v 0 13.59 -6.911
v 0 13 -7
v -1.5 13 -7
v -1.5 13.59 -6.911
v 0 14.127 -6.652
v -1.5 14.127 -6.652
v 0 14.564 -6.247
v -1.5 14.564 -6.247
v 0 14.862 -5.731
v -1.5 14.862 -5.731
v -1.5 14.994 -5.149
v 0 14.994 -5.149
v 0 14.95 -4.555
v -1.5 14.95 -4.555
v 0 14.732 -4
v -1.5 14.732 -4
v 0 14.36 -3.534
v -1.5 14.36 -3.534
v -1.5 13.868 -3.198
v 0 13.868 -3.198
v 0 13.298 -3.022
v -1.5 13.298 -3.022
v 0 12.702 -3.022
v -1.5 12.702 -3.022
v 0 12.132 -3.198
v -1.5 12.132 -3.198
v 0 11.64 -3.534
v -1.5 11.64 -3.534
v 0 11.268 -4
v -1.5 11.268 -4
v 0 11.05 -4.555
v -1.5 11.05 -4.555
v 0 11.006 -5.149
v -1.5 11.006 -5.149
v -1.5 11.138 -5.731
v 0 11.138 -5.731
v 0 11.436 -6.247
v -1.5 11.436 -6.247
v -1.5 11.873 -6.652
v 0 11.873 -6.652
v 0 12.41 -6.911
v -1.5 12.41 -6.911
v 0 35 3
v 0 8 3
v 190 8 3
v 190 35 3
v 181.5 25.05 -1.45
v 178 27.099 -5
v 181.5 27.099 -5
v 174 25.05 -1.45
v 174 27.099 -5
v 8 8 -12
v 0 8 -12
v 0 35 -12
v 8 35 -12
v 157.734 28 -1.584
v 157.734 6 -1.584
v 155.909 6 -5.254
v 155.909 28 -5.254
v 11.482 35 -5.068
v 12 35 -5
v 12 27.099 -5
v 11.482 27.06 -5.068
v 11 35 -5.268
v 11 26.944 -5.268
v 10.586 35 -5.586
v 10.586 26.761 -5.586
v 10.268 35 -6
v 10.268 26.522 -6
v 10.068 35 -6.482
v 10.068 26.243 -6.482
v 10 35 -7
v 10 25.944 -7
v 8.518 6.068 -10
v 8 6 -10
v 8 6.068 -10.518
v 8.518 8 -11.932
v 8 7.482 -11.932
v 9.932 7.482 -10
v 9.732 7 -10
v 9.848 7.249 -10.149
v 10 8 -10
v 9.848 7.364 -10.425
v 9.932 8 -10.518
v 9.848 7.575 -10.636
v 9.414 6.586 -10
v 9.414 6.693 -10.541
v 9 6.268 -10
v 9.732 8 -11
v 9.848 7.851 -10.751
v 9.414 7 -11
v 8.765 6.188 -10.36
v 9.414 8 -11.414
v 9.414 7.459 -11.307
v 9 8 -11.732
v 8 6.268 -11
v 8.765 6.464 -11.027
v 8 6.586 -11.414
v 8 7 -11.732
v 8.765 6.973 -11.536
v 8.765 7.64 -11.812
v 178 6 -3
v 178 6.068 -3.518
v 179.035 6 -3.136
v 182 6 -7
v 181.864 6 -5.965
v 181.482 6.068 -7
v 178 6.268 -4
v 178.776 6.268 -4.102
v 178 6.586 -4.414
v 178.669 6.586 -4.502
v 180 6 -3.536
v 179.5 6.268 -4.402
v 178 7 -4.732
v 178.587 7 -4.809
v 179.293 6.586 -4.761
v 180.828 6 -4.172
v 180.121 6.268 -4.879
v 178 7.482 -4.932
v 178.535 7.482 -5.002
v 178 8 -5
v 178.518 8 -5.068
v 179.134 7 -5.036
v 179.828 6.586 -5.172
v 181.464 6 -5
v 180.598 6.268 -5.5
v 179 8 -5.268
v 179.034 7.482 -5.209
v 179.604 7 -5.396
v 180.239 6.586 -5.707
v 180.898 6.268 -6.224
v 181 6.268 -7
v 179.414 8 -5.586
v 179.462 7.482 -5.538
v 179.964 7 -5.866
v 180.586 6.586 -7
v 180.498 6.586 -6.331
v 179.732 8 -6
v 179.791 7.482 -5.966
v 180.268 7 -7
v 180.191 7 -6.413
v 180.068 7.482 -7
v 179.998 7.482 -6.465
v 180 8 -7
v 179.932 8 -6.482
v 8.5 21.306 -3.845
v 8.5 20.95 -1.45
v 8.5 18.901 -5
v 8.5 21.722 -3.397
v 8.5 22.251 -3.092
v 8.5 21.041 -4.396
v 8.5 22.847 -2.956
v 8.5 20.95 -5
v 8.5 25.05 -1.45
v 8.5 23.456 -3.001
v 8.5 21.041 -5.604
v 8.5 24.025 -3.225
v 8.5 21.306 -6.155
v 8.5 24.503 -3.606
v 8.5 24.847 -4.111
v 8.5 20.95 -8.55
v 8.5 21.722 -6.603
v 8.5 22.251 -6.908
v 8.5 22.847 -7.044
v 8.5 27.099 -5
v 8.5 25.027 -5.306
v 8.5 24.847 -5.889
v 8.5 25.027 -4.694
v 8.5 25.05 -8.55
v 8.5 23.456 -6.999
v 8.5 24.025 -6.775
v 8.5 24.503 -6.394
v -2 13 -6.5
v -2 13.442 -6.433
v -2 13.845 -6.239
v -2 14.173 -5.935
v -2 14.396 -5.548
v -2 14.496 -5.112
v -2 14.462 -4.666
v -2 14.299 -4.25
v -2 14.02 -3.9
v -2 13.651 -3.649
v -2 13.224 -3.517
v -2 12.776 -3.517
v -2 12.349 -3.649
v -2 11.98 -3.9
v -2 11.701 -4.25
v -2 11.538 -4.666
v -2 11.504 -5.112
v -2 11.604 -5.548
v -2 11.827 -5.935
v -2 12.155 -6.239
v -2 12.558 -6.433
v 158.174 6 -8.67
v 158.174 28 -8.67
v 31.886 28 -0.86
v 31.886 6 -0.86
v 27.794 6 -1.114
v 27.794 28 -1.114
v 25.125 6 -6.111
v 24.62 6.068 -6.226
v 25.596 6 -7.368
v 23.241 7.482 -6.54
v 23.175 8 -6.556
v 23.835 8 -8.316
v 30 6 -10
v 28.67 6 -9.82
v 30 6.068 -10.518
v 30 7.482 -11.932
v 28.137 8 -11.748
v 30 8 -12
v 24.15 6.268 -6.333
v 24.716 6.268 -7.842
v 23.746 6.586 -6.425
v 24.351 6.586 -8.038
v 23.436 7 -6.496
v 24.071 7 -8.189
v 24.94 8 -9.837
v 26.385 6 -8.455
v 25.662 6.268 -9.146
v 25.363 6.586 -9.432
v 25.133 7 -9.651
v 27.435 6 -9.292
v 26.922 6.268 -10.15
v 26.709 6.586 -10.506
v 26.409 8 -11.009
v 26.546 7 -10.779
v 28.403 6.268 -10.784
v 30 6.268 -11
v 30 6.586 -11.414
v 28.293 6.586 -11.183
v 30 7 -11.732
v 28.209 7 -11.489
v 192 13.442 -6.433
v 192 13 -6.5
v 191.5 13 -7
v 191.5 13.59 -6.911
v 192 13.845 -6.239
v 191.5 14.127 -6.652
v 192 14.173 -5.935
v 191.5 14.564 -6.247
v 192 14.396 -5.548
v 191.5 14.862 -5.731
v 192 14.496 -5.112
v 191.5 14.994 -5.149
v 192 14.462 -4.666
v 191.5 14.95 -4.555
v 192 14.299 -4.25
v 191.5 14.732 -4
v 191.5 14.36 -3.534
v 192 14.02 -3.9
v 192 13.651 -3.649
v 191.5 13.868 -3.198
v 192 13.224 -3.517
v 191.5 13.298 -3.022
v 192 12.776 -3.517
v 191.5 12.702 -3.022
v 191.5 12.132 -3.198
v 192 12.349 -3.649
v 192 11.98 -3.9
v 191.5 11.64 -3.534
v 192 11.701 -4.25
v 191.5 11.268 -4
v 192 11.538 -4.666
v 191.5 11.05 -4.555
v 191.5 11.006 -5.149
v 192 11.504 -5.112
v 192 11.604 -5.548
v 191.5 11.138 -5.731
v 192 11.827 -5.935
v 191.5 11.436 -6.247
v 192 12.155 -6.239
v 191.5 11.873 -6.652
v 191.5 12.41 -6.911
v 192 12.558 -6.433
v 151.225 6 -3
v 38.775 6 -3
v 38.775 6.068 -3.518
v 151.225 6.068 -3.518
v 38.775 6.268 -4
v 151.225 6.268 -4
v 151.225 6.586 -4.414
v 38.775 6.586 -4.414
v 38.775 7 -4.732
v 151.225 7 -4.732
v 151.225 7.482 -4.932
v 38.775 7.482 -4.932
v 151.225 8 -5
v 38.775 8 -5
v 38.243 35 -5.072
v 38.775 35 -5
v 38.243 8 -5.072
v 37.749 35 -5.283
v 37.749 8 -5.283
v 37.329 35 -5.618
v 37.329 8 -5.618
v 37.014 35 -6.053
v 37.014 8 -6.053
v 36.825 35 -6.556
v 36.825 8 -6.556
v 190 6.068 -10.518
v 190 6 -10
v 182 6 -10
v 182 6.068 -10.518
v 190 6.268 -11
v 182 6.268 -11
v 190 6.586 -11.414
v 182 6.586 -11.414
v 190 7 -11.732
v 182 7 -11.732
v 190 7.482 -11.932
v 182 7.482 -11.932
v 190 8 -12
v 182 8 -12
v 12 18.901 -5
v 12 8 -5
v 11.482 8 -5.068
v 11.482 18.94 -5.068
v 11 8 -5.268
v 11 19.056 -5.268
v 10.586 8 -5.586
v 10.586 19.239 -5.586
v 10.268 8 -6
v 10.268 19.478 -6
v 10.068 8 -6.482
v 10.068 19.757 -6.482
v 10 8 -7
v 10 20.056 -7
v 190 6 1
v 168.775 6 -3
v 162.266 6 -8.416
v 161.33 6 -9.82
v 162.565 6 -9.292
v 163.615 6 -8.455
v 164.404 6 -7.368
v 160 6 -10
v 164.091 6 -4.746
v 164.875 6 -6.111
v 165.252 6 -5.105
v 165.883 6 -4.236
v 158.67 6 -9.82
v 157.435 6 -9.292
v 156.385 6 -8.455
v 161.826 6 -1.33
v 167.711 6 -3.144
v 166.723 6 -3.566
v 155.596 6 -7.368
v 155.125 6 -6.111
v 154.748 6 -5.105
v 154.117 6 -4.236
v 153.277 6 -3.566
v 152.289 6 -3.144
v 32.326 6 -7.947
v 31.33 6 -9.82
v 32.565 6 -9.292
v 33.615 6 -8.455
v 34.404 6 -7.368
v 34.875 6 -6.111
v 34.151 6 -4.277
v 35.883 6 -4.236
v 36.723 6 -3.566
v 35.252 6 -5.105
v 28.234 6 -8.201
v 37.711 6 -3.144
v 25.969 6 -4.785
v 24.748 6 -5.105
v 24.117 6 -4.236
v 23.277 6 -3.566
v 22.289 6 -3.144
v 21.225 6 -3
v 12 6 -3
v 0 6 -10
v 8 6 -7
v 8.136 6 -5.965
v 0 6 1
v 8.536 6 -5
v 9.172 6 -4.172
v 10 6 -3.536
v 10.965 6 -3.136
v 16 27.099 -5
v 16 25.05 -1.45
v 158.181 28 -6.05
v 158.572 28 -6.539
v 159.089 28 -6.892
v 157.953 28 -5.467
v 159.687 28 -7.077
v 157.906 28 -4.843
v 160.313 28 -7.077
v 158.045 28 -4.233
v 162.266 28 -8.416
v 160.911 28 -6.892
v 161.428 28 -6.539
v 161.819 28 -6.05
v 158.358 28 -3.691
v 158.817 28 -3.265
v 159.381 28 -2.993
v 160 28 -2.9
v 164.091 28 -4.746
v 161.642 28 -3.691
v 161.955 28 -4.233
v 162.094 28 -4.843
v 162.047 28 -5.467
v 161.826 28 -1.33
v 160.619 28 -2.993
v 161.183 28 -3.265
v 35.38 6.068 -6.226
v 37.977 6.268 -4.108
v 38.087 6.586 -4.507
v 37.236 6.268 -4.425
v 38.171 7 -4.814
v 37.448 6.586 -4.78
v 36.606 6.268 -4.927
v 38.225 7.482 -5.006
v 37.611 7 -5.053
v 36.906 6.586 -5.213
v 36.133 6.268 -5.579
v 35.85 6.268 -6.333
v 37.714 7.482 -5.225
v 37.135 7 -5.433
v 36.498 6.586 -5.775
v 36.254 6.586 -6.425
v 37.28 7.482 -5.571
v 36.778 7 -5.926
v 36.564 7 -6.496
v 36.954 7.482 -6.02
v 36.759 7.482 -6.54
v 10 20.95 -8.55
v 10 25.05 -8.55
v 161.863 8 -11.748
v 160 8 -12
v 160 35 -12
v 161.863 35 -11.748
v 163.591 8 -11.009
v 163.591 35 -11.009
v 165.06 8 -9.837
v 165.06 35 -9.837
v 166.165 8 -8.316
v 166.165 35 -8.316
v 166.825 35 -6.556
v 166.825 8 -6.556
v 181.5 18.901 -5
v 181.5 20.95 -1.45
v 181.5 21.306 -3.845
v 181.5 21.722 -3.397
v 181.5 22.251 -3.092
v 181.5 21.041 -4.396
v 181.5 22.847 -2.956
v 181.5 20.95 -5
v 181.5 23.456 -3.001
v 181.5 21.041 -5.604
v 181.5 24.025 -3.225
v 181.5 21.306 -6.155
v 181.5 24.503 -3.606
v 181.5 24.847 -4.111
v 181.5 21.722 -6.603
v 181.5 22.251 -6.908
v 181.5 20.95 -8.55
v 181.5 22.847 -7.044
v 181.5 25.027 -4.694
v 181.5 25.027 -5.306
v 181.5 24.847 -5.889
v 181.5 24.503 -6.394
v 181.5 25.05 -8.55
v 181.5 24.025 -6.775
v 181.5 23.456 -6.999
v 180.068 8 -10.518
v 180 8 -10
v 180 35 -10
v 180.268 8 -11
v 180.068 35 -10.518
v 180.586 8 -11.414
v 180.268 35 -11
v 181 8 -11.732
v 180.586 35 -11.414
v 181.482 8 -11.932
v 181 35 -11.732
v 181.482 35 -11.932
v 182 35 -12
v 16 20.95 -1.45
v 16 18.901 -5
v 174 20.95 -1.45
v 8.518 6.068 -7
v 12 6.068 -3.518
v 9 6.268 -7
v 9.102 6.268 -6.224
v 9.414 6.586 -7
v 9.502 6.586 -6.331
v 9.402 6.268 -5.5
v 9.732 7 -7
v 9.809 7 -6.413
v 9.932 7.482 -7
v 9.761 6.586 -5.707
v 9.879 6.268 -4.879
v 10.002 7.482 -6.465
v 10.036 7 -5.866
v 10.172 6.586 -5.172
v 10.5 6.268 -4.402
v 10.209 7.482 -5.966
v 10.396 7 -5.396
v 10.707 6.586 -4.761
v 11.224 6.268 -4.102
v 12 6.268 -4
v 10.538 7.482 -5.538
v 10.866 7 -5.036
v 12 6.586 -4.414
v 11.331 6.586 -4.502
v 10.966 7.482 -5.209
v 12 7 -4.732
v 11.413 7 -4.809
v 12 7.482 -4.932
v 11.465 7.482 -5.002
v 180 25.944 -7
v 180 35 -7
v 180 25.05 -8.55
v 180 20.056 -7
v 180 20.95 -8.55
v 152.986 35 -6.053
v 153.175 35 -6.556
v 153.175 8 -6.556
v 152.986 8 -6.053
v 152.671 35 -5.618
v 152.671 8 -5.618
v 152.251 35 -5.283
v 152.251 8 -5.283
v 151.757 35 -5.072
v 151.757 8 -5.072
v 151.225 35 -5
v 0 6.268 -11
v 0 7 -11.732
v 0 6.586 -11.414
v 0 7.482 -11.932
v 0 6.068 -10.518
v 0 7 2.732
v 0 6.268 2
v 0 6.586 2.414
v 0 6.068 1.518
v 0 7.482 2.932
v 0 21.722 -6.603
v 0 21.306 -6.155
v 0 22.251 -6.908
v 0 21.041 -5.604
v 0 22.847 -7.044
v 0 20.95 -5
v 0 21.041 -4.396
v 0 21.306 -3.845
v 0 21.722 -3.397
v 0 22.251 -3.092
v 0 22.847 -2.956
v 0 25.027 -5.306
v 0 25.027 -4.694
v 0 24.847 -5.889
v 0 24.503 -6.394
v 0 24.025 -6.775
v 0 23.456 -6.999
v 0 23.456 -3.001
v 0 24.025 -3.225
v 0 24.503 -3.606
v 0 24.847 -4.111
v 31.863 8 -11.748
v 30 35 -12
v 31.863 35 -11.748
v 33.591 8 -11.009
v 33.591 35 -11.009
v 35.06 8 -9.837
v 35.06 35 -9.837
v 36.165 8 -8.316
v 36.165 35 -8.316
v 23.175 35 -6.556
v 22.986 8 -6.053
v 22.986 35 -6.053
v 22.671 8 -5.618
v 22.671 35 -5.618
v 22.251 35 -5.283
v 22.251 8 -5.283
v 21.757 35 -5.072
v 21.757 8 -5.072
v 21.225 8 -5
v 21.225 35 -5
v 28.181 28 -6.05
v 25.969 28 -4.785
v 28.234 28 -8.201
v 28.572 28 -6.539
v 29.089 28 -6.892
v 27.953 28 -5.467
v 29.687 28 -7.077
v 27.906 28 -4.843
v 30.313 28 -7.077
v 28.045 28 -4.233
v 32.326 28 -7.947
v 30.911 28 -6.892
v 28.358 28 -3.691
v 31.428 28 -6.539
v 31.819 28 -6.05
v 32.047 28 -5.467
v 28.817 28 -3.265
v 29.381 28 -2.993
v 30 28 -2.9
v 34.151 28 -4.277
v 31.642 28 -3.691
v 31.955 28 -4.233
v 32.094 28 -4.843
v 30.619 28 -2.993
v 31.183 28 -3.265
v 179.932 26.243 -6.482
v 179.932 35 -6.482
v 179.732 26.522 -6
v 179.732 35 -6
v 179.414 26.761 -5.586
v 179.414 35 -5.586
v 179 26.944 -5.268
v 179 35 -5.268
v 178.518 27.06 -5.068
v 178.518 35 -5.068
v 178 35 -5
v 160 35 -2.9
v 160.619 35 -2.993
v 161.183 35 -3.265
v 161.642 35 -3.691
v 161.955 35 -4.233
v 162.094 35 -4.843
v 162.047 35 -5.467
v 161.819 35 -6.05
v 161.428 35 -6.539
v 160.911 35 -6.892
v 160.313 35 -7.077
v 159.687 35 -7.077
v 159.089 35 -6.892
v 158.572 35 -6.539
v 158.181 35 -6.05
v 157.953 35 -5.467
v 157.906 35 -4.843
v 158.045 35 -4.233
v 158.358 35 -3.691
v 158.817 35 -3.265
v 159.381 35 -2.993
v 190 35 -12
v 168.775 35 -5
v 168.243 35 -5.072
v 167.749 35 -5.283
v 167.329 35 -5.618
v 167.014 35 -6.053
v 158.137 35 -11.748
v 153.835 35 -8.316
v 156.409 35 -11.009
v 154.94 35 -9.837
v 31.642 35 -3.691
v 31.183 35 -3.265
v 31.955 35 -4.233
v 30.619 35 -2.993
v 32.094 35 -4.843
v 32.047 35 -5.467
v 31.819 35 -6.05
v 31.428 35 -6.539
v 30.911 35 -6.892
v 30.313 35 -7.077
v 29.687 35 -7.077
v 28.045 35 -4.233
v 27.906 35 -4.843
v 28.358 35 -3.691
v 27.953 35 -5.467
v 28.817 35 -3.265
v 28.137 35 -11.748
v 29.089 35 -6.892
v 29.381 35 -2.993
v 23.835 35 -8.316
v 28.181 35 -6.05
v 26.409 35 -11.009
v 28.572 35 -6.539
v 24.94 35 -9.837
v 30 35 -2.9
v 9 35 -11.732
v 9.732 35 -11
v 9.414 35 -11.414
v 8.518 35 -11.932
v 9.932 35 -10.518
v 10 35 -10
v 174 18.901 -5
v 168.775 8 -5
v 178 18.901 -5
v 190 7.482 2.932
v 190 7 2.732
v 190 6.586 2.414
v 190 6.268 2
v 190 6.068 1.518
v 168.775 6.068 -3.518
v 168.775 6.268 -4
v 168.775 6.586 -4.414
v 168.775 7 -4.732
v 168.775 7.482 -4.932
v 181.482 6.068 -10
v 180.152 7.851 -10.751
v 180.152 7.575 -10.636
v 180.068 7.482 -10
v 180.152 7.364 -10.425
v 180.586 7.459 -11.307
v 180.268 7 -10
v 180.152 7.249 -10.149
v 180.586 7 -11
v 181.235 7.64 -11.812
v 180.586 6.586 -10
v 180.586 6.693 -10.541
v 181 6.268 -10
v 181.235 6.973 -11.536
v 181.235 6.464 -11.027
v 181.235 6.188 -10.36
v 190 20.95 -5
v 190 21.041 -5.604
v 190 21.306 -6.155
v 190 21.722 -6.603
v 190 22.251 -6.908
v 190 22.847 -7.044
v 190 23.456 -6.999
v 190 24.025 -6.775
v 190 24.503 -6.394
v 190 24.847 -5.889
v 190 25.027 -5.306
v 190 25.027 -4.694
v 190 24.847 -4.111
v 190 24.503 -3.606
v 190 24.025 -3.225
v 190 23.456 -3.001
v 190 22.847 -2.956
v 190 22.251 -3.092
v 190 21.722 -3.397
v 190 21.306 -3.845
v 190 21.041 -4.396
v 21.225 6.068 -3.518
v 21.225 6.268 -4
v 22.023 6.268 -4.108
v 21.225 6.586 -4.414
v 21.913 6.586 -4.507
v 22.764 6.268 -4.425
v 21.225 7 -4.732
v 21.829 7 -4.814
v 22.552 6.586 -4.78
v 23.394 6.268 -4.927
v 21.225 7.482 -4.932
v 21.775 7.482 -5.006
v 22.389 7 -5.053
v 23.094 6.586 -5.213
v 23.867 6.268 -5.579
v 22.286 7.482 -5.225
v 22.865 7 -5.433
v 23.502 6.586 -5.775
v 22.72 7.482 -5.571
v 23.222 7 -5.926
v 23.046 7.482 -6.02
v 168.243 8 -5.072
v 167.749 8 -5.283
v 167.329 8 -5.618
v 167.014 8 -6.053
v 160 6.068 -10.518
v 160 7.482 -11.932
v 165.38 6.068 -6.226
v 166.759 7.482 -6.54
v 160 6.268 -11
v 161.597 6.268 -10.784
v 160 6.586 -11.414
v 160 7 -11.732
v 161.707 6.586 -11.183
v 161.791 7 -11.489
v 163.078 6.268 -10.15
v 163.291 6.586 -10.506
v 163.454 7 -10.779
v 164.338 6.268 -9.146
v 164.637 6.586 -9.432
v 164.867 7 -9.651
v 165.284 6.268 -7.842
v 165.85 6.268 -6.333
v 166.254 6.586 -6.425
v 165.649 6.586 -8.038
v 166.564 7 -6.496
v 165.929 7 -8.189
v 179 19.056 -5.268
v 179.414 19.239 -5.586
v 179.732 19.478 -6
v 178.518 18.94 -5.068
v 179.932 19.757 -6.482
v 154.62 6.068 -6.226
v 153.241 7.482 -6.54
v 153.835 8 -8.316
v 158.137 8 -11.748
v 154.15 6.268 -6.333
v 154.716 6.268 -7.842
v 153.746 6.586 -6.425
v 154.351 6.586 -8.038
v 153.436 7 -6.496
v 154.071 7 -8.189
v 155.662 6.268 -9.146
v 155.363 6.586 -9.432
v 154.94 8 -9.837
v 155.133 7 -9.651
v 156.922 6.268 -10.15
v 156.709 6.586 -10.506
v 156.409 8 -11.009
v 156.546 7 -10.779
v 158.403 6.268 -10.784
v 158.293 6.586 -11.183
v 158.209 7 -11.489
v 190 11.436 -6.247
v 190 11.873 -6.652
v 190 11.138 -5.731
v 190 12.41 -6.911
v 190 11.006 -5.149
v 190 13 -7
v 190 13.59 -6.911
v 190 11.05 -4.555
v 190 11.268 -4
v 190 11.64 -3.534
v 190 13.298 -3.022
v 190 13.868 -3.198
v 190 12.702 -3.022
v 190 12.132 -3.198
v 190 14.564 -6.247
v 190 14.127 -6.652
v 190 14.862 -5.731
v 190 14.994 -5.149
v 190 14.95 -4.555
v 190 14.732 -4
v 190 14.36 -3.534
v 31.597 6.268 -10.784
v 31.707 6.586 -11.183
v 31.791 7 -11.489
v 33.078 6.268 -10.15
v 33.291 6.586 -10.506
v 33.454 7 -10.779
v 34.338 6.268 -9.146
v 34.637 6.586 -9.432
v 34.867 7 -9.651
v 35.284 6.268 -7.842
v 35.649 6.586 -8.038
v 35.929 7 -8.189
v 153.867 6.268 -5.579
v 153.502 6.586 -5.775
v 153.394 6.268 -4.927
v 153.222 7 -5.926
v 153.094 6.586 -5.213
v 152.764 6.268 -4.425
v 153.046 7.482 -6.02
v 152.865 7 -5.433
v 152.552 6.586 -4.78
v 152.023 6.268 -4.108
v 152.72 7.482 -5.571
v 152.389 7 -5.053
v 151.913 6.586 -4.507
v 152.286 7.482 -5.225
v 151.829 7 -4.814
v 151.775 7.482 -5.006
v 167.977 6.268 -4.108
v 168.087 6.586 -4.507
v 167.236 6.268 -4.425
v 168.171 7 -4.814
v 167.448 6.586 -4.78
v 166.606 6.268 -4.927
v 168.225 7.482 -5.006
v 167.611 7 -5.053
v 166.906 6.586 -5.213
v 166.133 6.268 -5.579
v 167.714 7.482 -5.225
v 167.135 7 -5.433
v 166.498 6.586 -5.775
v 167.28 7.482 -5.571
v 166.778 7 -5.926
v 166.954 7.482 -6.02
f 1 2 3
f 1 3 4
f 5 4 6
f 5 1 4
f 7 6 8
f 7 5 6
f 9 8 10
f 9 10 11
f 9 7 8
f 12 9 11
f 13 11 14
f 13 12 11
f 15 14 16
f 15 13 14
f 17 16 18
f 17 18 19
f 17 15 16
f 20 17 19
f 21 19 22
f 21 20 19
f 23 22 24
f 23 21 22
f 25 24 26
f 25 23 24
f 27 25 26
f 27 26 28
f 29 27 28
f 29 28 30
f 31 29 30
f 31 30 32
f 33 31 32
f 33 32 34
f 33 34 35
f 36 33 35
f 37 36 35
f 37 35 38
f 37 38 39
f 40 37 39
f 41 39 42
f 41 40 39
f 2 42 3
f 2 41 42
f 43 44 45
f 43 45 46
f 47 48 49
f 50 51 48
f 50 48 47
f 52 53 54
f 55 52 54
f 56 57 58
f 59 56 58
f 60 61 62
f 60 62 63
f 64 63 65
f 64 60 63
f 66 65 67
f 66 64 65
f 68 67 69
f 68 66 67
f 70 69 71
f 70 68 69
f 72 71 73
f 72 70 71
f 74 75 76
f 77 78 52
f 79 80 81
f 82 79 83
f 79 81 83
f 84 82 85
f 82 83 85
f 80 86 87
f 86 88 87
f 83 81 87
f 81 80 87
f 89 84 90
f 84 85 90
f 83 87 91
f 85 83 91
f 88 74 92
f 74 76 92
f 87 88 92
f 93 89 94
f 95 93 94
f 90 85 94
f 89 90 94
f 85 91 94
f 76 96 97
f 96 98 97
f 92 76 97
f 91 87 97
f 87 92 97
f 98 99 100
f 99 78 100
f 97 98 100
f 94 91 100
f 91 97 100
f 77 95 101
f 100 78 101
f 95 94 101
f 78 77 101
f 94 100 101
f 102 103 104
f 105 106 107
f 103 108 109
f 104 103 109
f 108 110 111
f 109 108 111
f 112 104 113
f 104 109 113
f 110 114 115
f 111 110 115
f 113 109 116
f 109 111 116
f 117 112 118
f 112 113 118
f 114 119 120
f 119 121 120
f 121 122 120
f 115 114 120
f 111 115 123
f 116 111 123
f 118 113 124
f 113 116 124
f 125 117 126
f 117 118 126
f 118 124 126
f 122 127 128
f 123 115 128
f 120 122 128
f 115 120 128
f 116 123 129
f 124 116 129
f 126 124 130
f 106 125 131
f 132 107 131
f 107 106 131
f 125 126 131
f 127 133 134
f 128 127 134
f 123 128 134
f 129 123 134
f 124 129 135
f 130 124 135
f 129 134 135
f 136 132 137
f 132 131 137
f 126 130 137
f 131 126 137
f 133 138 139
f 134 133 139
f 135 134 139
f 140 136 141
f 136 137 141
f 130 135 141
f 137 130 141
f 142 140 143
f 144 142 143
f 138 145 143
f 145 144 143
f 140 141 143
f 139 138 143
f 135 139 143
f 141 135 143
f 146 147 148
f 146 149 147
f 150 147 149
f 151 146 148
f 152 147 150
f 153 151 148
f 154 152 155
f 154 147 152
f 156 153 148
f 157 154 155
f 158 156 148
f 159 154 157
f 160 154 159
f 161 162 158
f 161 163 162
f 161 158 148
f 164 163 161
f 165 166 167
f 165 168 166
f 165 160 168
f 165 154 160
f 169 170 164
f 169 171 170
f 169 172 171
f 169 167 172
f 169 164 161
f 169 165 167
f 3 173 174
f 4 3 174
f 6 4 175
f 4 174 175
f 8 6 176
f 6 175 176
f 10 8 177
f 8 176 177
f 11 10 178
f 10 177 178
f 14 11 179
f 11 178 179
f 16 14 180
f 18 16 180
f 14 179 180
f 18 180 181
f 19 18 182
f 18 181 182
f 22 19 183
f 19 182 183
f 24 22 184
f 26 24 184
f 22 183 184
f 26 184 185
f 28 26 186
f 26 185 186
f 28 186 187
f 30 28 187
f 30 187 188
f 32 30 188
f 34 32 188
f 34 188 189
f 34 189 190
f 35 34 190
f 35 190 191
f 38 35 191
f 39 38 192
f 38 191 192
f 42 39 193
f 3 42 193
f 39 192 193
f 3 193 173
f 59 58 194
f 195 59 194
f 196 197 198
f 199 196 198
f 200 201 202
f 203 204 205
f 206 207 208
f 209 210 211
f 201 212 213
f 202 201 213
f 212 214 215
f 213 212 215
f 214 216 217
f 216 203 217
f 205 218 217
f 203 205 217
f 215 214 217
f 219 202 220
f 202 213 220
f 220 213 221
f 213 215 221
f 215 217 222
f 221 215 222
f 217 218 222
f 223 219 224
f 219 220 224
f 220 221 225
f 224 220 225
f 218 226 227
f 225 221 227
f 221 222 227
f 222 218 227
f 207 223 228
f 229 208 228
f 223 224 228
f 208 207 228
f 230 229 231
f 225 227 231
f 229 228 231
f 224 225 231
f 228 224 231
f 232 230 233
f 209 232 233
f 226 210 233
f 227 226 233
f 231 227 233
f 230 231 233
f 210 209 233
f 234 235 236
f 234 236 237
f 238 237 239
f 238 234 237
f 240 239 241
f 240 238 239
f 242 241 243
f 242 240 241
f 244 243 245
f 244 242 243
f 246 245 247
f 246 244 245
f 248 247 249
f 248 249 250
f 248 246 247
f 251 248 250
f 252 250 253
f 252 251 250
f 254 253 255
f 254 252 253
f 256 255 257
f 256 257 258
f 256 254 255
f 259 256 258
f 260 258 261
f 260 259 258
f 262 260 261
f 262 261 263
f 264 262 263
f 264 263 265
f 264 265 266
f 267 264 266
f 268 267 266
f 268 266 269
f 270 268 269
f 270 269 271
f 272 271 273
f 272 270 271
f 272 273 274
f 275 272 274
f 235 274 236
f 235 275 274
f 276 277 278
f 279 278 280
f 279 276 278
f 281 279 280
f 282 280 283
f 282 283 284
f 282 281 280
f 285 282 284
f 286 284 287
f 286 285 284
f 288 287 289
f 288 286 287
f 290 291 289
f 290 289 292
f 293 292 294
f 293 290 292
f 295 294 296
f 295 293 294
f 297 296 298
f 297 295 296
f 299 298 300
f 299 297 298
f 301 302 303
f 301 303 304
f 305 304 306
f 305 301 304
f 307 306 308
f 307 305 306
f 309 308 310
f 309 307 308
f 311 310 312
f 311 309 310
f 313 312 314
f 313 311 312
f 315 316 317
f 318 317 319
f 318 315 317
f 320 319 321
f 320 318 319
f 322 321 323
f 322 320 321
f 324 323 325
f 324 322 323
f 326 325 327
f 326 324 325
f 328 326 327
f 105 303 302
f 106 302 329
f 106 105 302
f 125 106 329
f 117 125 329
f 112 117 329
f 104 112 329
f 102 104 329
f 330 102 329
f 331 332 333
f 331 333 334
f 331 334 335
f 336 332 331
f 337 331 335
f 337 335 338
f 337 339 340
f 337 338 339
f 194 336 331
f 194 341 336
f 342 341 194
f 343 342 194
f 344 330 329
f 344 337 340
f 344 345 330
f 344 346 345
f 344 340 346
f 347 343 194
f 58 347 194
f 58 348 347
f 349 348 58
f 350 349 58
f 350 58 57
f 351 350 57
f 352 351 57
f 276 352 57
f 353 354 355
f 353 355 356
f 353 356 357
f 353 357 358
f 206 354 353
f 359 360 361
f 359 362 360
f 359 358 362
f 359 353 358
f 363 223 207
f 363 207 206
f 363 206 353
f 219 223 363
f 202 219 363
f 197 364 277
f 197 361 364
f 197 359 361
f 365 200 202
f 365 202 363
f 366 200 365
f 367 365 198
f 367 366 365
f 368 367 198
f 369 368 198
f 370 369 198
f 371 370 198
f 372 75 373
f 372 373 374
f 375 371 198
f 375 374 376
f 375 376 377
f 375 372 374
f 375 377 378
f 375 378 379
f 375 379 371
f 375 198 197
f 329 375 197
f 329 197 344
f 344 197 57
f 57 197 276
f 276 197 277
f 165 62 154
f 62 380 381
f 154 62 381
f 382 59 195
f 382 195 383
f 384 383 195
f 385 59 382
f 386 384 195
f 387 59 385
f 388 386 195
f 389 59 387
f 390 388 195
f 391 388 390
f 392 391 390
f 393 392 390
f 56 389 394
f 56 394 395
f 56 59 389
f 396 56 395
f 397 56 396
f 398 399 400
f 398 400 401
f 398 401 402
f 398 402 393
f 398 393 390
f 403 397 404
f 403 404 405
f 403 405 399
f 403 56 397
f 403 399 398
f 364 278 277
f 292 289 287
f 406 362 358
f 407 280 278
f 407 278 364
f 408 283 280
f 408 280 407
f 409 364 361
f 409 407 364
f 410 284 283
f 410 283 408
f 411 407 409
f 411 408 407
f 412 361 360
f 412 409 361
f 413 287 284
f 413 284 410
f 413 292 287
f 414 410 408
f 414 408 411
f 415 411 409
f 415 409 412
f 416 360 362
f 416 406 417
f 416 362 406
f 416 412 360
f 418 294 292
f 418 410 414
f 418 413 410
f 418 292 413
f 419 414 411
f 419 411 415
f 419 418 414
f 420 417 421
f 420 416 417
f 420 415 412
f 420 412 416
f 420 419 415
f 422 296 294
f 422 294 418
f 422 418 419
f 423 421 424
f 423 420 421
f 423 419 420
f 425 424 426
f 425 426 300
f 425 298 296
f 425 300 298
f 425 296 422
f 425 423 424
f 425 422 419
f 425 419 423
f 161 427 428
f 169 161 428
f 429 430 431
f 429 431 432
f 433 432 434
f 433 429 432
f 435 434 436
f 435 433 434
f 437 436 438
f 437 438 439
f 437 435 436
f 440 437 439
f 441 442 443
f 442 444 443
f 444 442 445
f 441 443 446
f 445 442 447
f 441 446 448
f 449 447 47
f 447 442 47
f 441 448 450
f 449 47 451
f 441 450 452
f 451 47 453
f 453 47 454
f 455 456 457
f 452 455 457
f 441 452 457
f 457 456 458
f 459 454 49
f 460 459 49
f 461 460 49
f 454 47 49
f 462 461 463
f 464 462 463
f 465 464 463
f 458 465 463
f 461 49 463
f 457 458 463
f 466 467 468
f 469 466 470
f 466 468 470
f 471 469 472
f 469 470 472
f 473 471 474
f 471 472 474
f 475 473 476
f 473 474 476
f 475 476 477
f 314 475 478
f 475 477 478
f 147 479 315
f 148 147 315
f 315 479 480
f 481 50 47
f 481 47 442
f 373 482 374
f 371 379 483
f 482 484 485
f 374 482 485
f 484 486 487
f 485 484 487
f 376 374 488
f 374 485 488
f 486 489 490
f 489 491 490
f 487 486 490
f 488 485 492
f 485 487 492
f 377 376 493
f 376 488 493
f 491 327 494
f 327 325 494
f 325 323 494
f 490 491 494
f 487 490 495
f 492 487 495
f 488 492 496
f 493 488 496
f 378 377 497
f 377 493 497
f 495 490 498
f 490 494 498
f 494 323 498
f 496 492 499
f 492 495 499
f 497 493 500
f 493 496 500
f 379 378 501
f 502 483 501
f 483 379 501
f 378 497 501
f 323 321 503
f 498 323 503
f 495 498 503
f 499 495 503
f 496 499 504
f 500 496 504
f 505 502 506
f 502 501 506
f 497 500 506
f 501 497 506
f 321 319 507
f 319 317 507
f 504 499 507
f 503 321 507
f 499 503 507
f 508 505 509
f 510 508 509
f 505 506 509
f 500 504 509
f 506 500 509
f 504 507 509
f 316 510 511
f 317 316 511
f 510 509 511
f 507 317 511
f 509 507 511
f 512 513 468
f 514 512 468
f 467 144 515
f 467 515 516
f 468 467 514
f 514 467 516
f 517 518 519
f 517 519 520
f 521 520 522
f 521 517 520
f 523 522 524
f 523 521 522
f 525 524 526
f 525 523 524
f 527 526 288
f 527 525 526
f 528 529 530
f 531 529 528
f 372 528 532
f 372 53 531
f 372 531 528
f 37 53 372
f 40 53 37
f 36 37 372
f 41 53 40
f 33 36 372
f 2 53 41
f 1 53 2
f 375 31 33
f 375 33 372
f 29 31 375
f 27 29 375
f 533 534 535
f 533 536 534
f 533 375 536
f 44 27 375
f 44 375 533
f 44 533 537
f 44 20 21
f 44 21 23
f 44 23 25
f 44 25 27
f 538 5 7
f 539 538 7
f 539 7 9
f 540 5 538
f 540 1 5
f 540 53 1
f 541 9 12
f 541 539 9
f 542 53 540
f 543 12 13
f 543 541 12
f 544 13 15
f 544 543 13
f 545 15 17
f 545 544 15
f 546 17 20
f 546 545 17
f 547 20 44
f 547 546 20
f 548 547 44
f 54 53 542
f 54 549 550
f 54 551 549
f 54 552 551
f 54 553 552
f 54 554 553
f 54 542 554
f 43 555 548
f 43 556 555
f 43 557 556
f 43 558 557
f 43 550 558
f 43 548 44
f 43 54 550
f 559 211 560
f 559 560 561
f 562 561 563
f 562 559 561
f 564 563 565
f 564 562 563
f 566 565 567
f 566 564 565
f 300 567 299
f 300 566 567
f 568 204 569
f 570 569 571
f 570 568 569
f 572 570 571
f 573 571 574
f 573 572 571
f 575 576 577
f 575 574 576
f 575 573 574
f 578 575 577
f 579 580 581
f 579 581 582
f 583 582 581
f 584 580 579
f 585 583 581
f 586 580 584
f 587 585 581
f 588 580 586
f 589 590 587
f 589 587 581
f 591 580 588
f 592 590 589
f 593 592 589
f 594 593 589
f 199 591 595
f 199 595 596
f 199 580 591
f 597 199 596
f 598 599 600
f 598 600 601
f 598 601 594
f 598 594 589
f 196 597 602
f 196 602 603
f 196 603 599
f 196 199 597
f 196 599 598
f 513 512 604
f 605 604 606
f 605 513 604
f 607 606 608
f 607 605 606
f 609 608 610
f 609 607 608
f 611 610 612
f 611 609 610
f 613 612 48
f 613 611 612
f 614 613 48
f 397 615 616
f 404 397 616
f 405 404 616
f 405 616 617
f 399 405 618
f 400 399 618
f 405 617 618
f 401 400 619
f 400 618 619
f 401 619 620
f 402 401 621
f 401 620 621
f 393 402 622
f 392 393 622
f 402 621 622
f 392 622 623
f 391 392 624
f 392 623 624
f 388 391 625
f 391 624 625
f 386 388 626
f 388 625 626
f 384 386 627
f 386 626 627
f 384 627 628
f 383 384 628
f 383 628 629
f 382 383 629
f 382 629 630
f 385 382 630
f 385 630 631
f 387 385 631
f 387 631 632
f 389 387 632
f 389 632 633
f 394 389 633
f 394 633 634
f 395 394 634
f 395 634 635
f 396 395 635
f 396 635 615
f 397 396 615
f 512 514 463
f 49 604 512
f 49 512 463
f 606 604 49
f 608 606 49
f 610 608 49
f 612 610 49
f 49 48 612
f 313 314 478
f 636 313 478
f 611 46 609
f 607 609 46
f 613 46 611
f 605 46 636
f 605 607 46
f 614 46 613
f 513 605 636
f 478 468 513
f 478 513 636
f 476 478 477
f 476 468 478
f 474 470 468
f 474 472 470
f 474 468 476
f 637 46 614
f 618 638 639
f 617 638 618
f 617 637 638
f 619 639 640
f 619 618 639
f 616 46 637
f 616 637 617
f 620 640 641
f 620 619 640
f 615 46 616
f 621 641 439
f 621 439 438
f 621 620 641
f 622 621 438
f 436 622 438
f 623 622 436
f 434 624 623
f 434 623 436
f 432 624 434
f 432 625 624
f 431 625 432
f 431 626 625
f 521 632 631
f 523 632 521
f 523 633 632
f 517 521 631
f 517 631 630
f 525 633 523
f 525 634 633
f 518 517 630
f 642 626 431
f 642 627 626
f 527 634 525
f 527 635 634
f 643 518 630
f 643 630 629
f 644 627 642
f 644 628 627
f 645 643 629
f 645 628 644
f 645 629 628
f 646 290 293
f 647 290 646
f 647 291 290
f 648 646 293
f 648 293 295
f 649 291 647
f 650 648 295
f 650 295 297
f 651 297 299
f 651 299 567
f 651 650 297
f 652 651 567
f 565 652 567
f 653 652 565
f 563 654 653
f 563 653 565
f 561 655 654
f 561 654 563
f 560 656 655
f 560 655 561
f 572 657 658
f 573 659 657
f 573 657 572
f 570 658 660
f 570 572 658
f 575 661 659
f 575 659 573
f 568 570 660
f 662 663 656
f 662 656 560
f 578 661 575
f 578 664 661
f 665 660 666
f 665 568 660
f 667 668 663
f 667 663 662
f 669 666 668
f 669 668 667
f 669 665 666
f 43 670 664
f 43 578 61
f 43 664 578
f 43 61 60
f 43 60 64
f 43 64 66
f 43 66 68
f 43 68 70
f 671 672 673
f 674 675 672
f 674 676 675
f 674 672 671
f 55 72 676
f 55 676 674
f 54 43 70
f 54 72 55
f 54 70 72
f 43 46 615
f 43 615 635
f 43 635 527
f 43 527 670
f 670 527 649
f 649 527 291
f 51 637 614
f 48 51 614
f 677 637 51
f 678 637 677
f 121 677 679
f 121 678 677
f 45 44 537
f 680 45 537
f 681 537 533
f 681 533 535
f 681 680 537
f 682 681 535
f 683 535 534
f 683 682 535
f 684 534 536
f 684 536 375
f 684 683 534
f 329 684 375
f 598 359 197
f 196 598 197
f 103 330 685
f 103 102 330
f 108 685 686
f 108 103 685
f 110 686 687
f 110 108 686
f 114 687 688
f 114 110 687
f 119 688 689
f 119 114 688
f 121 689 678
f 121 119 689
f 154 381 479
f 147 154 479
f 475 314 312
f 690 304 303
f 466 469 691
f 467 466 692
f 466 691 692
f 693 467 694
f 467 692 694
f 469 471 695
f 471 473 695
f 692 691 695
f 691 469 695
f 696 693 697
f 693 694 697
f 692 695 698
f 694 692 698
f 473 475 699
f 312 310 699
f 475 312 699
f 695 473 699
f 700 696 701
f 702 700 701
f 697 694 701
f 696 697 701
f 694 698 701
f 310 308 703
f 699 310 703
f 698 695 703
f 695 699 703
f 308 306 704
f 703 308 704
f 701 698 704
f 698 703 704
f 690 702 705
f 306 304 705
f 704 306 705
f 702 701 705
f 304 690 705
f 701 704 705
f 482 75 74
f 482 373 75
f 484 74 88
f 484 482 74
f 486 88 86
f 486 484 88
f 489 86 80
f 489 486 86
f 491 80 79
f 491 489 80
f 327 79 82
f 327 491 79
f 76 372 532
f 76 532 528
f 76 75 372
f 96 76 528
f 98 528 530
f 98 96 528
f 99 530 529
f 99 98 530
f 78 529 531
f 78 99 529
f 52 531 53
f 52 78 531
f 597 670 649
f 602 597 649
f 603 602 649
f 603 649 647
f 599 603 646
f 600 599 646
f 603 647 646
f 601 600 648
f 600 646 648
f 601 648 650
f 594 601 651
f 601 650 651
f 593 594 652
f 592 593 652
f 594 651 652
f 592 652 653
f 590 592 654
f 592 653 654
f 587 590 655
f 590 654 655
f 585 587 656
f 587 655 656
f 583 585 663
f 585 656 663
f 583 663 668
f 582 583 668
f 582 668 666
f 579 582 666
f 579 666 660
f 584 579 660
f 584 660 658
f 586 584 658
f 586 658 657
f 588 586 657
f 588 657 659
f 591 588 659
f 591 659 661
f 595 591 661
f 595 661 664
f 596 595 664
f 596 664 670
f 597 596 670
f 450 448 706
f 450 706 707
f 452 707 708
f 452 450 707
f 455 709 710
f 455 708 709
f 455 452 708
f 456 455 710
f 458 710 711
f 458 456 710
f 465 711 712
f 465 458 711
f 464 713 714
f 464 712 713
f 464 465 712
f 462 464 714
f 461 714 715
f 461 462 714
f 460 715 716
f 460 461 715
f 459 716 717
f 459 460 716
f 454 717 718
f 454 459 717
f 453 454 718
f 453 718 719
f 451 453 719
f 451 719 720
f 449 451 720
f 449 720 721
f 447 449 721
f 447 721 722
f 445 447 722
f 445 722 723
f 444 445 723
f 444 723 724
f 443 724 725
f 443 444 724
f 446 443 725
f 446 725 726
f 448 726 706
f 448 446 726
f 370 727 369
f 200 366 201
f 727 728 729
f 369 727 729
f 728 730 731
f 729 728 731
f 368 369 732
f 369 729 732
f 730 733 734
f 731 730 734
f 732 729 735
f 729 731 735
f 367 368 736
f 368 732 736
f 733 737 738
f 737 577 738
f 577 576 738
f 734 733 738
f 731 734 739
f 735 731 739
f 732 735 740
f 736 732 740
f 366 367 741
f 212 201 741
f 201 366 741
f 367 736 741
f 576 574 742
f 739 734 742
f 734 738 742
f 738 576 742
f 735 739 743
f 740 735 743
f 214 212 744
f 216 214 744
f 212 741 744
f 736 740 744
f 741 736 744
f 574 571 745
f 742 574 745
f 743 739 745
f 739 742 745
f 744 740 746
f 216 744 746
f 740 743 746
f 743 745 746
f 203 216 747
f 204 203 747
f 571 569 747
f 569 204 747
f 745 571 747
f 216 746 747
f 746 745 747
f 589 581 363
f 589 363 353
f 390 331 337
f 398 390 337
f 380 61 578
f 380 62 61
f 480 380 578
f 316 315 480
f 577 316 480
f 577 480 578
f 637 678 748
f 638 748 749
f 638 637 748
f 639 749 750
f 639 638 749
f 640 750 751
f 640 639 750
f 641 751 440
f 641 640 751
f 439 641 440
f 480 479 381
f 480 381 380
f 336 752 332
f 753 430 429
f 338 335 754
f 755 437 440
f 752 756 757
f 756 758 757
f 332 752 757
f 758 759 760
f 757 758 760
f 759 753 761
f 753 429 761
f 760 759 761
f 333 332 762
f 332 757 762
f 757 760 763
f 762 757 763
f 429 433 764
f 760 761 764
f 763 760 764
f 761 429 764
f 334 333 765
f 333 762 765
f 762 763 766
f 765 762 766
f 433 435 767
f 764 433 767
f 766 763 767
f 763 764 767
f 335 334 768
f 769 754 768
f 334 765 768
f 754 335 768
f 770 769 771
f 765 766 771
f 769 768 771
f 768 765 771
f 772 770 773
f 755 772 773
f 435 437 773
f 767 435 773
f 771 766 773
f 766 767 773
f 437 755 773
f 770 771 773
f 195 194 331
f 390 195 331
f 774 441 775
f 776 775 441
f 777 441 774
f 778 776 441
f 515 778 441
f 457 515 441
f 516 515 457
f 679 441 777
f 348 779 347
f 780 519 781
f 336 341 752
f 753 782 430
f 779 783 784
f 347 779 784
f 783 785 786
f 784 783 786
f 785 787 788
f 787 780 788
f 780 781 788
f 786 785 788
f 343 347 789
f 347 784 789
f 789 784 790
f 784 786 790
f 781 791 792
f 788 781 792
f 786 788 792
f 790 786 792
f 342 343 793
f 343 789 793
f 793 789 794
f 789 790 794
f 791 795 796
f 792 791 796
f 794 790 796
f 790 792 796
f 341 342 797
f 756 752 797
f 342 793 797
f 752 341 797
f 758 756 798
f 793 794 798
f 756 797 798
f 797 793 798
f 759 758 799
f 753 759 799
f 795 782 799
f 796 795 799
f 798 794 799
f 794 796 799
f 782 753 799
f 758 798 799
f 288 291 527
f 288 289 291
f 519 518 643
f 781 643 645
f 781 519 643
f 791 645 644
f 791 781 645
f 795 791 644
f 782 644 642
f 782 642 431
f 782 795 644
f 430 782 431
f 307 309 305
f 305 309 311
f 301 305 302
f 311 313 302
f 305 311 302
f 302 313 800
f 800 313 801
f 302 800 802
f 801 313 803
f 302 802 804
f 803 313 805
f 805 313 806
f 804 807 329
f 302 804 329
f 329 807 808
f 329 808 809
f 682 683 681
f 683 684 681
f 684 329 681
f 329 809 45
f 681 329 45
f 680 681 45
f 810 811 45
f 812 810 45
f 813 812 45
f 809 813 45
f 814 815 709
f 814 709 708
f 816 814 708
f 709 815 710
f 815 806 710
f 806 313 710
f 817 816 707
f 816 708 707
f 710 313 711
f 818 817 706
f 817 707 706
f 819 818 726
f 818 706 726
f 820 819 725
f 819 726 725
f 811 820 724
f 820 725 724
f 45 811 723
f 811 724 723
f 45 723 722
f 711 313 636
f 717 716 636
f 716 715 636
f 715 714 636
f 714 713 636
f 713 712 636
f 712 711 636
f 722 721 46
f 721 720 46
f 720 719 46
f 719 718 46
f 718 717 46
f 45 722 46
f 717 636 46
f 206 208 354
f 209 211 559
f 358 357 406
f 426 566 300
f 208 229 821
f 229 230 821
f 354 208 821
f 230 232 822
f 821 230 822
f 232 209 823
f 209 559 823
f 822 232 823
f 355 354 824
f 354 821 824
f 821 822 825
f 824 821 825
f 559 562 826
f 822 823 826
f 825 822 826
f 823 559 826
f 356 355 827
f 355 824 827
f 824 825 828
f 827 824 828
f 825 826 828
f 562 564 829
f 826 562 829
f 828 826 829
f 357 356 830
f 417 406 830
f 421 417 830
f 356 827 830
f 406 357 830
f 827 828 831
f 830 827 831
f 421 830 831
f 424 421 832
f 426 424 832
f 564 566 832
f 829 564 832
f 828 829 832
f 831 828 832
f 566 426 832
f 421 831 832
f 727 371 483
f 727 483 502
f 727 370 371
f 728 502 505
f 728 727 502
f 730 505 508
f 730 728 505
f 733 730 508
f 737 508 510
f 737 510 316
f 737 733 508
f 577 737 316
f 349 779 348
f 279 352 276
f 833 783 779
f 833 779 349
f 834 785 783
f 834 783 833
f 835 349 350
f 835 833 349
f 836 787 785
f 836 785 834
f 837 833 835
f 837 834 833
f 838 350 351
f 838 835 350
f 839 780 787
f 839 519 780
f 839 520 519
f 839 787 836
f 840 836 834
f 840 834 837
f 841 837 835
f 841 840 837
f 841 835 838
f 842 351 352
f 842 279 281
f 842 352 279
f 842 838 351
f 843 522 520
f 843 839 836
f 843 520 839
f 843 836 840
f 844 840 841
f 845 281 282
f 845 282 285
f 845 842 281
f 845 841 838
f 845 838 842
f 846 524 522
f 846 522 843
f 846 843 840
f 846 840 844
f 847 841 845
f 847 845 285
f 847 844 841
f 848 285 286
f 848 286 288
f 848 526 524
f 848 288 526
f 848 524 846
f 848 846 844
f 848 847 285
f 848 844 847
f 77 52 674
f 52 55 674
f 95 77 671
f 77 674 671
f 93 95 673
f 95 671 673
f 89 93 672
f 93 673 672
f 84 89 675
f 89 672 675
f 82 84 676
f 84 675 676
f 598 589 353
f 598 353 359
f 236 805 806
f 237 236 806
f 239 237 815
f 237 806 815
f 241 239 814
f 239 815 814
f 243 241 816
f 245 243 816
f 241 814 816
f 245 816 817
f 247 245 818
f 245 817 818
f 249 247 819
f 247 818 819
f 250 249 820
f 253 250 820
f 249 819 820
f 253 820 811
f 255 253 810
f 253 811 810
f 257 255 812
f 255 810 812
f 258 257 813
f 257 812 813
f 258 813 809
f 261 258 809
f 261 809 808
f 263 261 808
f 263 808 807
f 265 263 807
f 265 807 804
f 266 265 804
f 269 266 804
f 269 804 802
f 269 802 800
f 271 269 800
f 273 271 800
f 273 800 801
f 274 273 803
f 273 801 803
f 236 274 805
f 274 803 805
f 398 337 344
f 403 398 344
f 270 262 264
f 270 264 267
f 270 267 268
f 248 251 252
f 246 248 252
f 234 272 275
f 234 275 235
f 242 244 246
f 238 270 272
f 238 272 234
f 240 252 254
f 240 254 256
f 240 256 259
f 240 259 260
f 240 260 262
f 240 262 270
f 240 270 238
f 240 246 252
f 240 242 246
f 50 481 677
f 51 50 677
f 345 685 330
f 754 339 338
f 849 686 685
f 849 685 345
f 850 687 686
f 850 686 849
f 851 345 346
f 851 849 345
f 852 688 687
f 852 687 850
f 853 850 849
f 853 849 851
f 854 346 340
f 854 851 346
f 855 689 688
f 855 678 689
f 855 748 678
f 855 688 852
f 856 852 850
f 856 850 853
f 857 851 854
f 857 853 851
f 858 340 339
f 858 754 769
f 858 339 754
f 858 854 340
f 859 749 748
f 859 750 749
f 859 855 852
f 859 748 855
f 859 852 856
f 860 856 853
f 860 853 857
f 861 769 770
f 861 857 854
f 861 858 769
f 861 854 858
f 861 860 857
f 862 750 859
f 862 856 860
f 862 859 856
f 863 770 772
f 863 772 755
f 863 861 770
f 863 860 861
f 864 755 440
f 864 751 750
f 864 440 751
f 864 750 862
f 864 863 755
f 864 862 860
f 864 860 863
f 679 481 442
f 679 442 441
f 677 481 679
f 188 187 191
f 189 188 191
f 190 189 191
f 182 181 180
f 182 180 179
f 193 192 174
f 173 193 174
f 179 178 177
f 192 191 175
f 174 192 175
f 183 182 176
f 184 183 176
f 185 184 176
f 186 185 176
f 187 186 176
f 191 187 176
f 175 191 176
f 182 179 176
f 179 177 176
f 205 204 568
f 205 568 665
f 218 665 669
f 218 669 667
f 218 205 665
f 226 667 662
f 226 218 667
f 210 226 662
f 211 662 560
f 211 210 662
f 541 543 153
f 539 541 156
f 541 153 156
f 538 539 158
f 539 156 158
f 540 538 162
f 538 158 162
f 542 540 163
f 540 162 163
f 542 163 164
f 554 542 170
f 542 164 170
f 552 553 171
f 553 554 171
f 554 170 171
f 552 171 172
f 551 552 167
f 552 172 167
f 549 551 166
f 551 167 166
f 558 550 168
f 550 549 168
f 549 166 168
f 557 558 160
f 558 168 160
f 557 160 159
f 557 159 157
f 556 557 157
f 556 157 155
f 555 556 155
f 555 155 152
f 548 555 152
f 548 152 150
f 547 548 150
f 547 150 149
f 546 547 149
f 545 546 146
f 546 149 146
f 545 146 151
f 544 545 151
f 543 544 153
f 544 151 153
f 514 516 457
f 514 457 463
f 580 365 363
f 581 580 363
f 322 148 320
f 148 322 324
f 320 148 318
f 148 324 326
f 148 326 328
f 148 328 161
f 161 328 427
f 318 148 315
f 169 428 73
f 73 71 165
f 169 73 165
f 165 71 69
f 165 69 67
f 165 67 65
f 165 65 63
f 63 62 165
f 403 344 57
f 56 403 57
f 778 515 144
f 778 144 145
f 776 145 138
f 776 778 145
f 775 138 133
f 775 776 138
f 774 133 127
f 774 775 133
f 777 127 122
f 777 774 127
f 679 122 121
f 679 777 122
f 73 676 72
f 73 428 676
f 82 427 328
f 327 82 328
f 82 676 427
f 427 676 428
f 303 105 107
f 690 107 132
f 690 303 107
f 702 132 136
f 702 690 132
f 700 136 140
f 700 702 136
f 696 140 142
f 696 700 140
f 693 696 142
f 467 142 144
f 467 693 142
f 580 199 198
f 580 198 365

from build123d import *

# Parameters (mm, degrees)
BOSS_EXTRUDE1_DEPTH      = 190
SKETCH2_R                = 2.1
CUT_EXTRUDE1_DEPTH       = 193.574660846
CUT_EXTRUDE3_START       = -29
CUT_EXTRUDE3_DEPTH       = 29
FILLET1_R                = 2
CUT_EXTRUDE4_DEPTH       = 22
CUT_EXTRUDE5_REACH       = 183.805
SKETCH5_R                = 2.05
CUT_EXTRUDE6_START       = -4
CUT_EXTRUDE6_DEPTH       = 7.5
SKETCH6_R                = 2
BOSS_EXTRUDE2_DEPTH      = 2
CHAMFER1_SIZE            = 0.5
CHAMFER1_OF_MIRROR1_SIZE = 0.5
FILLET2_R                = 2


# Read off the part's stored shape, not the designer's step: Cut-Extrude3
with BuildPart() as part:
    # Sketch1 → Boss-Extrude1 (new body)
    with BuildSketch(Plane(origin=(0, 0, 0), x_dir=(0, 0, -1), z_dir=(1, 0, 0))):
        Polygon((-3, 6), (-3, 35), (12, 35), (12, 21.281778339), (12, 18), (12, 6), align=None)
    extrude(amount=BOSS_EXTRUDE1_DEPTH)

    # Sketch2 → Cut-Extrude1 (cut, through all)
    with BuildSketch(Plane(origin=(0, 35, 0), x_dir=(1, 0, 0), z_dir=(0, 1, 0))):
        with Locations(Location((160, 5, 0), (0, 0, 270))):
            Circle(SKETCH2_R)
        with Locations(Location((30, 5, 0), (0, 0, 270))):
            Circle(SKETCH2_R)
    extrude(amount=-CUT_EXTRUDE1_DEPTH, mode=Mode.SUBTRACT)

    # Cut-Extrude3 outline → Cut-Extrude3 (cut)
    with BuildSketch(Plane(origin=(0, 35, 0), x_dir=(1, 0, 0), z_dir=(0, 1, 0)).offset(CUT_EXTRUDE3_START)):
        with BuildLine():
            ThreePointArc((23, 5), (25.050252532, 9.949747468), (30, 12))
            Line((30, 12), (10, 12))
            Line((10, 12), (10, 5))
            Line((10, 5), (23, 5))
        make_face()
        with BuildLine():
            Line((180, 12), (160, 12))
            ThreePointArc((160, 12), (164.949747468, 9.949747468), (167, 5))
            Line((167, 5), (180, 5))
            Line((180, 5), (180, 12))
        make_face()
        with BuildLine():
            Line((37, 5), (153, 5))
            ThreePointArc((153, 5), (155.050252532, 9.949747468), (160, 12))
            Line((160, 12), (30, 12))
            ThreePointArc((30, 12), (34.949747468, 9.949747468), (37, 5))
        make_face()
    extrude(amount=CUT_EXTRUDE3_DEPTH, mode=Mode.SUBTRACT)

    # Fillet1
    fillet1_edges = [part.edges().sort_by_distance(p)[0] for p in [
        (10, 20.5, -5),
        (180, 20.5, -5),
    ]]
    fillet(fillet1_edges, radius=FILLET1_R)

    # Sketch4 → Cut-Extrude4 (cut)
    with BuildSketch(Plane.XZ.offset(-6)):
        Polygon((34.151410886, -4.276672839), (31.885792779, -0.8604896), (27.794482256, -1.114480816), (25.968789841, -4.784655272), (28.234407948, -8.200838512), (32.325718471, -7.946847295), align=None)
        Polygon((164.091310523, -4.746008784), (161.825692416, -1.329825544), (157.734381893, -1.583816761), (155.908689477, -5.253991216), (158.174307584, -8.670174456), (162.265618107, -8.416183239), align=None)
    extrude(amount=-CUT_EXTRUDE4_DEPTH, mode=Mode.SUBTRACT)

    # Sketch5 → Cut-Extrude5 (cut, up to next)
    with BuildSketch(Plane(origin=(178, 0, 0), x_dir=(0, 0, -1), z_dir=(1, 0, 0)), mode=Mode.PRIVATE) as cut_extrude5_sk1:
        with Locations(Location((5, 23, 0), (0, 0, 270))):
            Circle(SKETCH5_R)
    cut_extrude5_tool1 = extrude(cut_extrude5_sk1.sketch, amount=CUT_EXTRUDE5_REACH, mode=Mode.PRIVATE) & part.part
    cut_extrude5 = cut_extrude5_tool1.solids().sort_by_distance((178, 23, -5))[0]
    add(cut_extrude5, mode=Mode.SUBTRACT)

    # Sketch5<3> → Cut-Extrude6 (cut)
    with BuildSketch(Plane(origin=(178, 0, 0), x_dir=(0, 0, -1), z_dir=(1, 0, 0)).offset(CUT_EXTRUDE6_START)):
        Polygon((5, 18.900813089), (8.55, 20.950406544), (8.55, 25.049593456), (5, 27.099186911), (1.45, 25.049593456), (1.45, 20.950406544), align=None)
    cut_extrude6 = extrude(amount=CUT_EXTRUDE6_DEPTH, mode=Mode.SUBTRACT)

    # Sketch6 → Boss-Extrude2 (add)
    with BuildSketch(Plane(origin=(190, 0, 0), x_dir=(0, 0, -1), z_dir=(1, 0, 0))):
        with Locations((5, 13)):
            Circle(SKETCH6_R)
    boss_extrude2 = extrude(amount=BOSS_EXTRUDE2_DEPTH)

    # Chamfer1
    chamfer1_edges = [part.edges().sort_by_distance(p)[0] for p in [
        (192, 13, -3),
    ]]
    chamfer(chamfer1_edges, length=CHAMFER1_SIZE)

    # Mirror1: Cut-Extrude5, Cut-Extrude6, Boss-Extrude2 across plane
    add(cut_extrude5.mirror(Plane(origin=(95, 0, 0), x_dir=(0, 0, 1), z_dir=(1, 0, 0))), mode=Mode.SUBTRACT)
    add(cut_extrude6.mirror(Plane(origin=(95, 0, 0), x_dir=(0, 0, 1), z_dir=(1, 0, 0))), mode=Mode.SUBTRACT)
    add(boss_extrude2.mirror(Plane(origin=(95, 0, 0), x_dir=(0, 0, 1), z_dir=(1, 0, 0))))

    # Chamfer1 of Mirror1
    chamfer1_of_mirror1_edges = [part.edges().sort_by_distance(p)[0] for p in [
        (-2, 13, -3),
    ]]
    chamfer(chamfer1_of_mirror1_edges, length=CHAMFER1_OF_MIRROR1_SIZE)

    # Fillet2
    fillet2_edges = [part.edges().sort_by_distance(p)[0] for p in [
        (185, 6, -12),
        (95, 6, 3),
        (153, 20.5, -5),
        (37, 20.5, -5),
        (164.949747468, 6, -9.949747468),
        (95, 6, -5),
        (34.949747468, 6, -9.949747468),
        (5, 6, -12),
        (23, 20.5, -5),
        (10, 6, -9.5),
        (10, 20.5, -12),
        (167, 20.5, -5),
        (180, 20.5, -12),
        (180, 6, -9.5),
        (17.5, 6, -5),
        (172.5, 6, -5),
        (10.585786438, 6, -5.585786438),
        (179.414213562, 6, -5.585786438),
    ]]
    fillet(fillet2_edges, radius=FILLET2_R)


solid = part.part
